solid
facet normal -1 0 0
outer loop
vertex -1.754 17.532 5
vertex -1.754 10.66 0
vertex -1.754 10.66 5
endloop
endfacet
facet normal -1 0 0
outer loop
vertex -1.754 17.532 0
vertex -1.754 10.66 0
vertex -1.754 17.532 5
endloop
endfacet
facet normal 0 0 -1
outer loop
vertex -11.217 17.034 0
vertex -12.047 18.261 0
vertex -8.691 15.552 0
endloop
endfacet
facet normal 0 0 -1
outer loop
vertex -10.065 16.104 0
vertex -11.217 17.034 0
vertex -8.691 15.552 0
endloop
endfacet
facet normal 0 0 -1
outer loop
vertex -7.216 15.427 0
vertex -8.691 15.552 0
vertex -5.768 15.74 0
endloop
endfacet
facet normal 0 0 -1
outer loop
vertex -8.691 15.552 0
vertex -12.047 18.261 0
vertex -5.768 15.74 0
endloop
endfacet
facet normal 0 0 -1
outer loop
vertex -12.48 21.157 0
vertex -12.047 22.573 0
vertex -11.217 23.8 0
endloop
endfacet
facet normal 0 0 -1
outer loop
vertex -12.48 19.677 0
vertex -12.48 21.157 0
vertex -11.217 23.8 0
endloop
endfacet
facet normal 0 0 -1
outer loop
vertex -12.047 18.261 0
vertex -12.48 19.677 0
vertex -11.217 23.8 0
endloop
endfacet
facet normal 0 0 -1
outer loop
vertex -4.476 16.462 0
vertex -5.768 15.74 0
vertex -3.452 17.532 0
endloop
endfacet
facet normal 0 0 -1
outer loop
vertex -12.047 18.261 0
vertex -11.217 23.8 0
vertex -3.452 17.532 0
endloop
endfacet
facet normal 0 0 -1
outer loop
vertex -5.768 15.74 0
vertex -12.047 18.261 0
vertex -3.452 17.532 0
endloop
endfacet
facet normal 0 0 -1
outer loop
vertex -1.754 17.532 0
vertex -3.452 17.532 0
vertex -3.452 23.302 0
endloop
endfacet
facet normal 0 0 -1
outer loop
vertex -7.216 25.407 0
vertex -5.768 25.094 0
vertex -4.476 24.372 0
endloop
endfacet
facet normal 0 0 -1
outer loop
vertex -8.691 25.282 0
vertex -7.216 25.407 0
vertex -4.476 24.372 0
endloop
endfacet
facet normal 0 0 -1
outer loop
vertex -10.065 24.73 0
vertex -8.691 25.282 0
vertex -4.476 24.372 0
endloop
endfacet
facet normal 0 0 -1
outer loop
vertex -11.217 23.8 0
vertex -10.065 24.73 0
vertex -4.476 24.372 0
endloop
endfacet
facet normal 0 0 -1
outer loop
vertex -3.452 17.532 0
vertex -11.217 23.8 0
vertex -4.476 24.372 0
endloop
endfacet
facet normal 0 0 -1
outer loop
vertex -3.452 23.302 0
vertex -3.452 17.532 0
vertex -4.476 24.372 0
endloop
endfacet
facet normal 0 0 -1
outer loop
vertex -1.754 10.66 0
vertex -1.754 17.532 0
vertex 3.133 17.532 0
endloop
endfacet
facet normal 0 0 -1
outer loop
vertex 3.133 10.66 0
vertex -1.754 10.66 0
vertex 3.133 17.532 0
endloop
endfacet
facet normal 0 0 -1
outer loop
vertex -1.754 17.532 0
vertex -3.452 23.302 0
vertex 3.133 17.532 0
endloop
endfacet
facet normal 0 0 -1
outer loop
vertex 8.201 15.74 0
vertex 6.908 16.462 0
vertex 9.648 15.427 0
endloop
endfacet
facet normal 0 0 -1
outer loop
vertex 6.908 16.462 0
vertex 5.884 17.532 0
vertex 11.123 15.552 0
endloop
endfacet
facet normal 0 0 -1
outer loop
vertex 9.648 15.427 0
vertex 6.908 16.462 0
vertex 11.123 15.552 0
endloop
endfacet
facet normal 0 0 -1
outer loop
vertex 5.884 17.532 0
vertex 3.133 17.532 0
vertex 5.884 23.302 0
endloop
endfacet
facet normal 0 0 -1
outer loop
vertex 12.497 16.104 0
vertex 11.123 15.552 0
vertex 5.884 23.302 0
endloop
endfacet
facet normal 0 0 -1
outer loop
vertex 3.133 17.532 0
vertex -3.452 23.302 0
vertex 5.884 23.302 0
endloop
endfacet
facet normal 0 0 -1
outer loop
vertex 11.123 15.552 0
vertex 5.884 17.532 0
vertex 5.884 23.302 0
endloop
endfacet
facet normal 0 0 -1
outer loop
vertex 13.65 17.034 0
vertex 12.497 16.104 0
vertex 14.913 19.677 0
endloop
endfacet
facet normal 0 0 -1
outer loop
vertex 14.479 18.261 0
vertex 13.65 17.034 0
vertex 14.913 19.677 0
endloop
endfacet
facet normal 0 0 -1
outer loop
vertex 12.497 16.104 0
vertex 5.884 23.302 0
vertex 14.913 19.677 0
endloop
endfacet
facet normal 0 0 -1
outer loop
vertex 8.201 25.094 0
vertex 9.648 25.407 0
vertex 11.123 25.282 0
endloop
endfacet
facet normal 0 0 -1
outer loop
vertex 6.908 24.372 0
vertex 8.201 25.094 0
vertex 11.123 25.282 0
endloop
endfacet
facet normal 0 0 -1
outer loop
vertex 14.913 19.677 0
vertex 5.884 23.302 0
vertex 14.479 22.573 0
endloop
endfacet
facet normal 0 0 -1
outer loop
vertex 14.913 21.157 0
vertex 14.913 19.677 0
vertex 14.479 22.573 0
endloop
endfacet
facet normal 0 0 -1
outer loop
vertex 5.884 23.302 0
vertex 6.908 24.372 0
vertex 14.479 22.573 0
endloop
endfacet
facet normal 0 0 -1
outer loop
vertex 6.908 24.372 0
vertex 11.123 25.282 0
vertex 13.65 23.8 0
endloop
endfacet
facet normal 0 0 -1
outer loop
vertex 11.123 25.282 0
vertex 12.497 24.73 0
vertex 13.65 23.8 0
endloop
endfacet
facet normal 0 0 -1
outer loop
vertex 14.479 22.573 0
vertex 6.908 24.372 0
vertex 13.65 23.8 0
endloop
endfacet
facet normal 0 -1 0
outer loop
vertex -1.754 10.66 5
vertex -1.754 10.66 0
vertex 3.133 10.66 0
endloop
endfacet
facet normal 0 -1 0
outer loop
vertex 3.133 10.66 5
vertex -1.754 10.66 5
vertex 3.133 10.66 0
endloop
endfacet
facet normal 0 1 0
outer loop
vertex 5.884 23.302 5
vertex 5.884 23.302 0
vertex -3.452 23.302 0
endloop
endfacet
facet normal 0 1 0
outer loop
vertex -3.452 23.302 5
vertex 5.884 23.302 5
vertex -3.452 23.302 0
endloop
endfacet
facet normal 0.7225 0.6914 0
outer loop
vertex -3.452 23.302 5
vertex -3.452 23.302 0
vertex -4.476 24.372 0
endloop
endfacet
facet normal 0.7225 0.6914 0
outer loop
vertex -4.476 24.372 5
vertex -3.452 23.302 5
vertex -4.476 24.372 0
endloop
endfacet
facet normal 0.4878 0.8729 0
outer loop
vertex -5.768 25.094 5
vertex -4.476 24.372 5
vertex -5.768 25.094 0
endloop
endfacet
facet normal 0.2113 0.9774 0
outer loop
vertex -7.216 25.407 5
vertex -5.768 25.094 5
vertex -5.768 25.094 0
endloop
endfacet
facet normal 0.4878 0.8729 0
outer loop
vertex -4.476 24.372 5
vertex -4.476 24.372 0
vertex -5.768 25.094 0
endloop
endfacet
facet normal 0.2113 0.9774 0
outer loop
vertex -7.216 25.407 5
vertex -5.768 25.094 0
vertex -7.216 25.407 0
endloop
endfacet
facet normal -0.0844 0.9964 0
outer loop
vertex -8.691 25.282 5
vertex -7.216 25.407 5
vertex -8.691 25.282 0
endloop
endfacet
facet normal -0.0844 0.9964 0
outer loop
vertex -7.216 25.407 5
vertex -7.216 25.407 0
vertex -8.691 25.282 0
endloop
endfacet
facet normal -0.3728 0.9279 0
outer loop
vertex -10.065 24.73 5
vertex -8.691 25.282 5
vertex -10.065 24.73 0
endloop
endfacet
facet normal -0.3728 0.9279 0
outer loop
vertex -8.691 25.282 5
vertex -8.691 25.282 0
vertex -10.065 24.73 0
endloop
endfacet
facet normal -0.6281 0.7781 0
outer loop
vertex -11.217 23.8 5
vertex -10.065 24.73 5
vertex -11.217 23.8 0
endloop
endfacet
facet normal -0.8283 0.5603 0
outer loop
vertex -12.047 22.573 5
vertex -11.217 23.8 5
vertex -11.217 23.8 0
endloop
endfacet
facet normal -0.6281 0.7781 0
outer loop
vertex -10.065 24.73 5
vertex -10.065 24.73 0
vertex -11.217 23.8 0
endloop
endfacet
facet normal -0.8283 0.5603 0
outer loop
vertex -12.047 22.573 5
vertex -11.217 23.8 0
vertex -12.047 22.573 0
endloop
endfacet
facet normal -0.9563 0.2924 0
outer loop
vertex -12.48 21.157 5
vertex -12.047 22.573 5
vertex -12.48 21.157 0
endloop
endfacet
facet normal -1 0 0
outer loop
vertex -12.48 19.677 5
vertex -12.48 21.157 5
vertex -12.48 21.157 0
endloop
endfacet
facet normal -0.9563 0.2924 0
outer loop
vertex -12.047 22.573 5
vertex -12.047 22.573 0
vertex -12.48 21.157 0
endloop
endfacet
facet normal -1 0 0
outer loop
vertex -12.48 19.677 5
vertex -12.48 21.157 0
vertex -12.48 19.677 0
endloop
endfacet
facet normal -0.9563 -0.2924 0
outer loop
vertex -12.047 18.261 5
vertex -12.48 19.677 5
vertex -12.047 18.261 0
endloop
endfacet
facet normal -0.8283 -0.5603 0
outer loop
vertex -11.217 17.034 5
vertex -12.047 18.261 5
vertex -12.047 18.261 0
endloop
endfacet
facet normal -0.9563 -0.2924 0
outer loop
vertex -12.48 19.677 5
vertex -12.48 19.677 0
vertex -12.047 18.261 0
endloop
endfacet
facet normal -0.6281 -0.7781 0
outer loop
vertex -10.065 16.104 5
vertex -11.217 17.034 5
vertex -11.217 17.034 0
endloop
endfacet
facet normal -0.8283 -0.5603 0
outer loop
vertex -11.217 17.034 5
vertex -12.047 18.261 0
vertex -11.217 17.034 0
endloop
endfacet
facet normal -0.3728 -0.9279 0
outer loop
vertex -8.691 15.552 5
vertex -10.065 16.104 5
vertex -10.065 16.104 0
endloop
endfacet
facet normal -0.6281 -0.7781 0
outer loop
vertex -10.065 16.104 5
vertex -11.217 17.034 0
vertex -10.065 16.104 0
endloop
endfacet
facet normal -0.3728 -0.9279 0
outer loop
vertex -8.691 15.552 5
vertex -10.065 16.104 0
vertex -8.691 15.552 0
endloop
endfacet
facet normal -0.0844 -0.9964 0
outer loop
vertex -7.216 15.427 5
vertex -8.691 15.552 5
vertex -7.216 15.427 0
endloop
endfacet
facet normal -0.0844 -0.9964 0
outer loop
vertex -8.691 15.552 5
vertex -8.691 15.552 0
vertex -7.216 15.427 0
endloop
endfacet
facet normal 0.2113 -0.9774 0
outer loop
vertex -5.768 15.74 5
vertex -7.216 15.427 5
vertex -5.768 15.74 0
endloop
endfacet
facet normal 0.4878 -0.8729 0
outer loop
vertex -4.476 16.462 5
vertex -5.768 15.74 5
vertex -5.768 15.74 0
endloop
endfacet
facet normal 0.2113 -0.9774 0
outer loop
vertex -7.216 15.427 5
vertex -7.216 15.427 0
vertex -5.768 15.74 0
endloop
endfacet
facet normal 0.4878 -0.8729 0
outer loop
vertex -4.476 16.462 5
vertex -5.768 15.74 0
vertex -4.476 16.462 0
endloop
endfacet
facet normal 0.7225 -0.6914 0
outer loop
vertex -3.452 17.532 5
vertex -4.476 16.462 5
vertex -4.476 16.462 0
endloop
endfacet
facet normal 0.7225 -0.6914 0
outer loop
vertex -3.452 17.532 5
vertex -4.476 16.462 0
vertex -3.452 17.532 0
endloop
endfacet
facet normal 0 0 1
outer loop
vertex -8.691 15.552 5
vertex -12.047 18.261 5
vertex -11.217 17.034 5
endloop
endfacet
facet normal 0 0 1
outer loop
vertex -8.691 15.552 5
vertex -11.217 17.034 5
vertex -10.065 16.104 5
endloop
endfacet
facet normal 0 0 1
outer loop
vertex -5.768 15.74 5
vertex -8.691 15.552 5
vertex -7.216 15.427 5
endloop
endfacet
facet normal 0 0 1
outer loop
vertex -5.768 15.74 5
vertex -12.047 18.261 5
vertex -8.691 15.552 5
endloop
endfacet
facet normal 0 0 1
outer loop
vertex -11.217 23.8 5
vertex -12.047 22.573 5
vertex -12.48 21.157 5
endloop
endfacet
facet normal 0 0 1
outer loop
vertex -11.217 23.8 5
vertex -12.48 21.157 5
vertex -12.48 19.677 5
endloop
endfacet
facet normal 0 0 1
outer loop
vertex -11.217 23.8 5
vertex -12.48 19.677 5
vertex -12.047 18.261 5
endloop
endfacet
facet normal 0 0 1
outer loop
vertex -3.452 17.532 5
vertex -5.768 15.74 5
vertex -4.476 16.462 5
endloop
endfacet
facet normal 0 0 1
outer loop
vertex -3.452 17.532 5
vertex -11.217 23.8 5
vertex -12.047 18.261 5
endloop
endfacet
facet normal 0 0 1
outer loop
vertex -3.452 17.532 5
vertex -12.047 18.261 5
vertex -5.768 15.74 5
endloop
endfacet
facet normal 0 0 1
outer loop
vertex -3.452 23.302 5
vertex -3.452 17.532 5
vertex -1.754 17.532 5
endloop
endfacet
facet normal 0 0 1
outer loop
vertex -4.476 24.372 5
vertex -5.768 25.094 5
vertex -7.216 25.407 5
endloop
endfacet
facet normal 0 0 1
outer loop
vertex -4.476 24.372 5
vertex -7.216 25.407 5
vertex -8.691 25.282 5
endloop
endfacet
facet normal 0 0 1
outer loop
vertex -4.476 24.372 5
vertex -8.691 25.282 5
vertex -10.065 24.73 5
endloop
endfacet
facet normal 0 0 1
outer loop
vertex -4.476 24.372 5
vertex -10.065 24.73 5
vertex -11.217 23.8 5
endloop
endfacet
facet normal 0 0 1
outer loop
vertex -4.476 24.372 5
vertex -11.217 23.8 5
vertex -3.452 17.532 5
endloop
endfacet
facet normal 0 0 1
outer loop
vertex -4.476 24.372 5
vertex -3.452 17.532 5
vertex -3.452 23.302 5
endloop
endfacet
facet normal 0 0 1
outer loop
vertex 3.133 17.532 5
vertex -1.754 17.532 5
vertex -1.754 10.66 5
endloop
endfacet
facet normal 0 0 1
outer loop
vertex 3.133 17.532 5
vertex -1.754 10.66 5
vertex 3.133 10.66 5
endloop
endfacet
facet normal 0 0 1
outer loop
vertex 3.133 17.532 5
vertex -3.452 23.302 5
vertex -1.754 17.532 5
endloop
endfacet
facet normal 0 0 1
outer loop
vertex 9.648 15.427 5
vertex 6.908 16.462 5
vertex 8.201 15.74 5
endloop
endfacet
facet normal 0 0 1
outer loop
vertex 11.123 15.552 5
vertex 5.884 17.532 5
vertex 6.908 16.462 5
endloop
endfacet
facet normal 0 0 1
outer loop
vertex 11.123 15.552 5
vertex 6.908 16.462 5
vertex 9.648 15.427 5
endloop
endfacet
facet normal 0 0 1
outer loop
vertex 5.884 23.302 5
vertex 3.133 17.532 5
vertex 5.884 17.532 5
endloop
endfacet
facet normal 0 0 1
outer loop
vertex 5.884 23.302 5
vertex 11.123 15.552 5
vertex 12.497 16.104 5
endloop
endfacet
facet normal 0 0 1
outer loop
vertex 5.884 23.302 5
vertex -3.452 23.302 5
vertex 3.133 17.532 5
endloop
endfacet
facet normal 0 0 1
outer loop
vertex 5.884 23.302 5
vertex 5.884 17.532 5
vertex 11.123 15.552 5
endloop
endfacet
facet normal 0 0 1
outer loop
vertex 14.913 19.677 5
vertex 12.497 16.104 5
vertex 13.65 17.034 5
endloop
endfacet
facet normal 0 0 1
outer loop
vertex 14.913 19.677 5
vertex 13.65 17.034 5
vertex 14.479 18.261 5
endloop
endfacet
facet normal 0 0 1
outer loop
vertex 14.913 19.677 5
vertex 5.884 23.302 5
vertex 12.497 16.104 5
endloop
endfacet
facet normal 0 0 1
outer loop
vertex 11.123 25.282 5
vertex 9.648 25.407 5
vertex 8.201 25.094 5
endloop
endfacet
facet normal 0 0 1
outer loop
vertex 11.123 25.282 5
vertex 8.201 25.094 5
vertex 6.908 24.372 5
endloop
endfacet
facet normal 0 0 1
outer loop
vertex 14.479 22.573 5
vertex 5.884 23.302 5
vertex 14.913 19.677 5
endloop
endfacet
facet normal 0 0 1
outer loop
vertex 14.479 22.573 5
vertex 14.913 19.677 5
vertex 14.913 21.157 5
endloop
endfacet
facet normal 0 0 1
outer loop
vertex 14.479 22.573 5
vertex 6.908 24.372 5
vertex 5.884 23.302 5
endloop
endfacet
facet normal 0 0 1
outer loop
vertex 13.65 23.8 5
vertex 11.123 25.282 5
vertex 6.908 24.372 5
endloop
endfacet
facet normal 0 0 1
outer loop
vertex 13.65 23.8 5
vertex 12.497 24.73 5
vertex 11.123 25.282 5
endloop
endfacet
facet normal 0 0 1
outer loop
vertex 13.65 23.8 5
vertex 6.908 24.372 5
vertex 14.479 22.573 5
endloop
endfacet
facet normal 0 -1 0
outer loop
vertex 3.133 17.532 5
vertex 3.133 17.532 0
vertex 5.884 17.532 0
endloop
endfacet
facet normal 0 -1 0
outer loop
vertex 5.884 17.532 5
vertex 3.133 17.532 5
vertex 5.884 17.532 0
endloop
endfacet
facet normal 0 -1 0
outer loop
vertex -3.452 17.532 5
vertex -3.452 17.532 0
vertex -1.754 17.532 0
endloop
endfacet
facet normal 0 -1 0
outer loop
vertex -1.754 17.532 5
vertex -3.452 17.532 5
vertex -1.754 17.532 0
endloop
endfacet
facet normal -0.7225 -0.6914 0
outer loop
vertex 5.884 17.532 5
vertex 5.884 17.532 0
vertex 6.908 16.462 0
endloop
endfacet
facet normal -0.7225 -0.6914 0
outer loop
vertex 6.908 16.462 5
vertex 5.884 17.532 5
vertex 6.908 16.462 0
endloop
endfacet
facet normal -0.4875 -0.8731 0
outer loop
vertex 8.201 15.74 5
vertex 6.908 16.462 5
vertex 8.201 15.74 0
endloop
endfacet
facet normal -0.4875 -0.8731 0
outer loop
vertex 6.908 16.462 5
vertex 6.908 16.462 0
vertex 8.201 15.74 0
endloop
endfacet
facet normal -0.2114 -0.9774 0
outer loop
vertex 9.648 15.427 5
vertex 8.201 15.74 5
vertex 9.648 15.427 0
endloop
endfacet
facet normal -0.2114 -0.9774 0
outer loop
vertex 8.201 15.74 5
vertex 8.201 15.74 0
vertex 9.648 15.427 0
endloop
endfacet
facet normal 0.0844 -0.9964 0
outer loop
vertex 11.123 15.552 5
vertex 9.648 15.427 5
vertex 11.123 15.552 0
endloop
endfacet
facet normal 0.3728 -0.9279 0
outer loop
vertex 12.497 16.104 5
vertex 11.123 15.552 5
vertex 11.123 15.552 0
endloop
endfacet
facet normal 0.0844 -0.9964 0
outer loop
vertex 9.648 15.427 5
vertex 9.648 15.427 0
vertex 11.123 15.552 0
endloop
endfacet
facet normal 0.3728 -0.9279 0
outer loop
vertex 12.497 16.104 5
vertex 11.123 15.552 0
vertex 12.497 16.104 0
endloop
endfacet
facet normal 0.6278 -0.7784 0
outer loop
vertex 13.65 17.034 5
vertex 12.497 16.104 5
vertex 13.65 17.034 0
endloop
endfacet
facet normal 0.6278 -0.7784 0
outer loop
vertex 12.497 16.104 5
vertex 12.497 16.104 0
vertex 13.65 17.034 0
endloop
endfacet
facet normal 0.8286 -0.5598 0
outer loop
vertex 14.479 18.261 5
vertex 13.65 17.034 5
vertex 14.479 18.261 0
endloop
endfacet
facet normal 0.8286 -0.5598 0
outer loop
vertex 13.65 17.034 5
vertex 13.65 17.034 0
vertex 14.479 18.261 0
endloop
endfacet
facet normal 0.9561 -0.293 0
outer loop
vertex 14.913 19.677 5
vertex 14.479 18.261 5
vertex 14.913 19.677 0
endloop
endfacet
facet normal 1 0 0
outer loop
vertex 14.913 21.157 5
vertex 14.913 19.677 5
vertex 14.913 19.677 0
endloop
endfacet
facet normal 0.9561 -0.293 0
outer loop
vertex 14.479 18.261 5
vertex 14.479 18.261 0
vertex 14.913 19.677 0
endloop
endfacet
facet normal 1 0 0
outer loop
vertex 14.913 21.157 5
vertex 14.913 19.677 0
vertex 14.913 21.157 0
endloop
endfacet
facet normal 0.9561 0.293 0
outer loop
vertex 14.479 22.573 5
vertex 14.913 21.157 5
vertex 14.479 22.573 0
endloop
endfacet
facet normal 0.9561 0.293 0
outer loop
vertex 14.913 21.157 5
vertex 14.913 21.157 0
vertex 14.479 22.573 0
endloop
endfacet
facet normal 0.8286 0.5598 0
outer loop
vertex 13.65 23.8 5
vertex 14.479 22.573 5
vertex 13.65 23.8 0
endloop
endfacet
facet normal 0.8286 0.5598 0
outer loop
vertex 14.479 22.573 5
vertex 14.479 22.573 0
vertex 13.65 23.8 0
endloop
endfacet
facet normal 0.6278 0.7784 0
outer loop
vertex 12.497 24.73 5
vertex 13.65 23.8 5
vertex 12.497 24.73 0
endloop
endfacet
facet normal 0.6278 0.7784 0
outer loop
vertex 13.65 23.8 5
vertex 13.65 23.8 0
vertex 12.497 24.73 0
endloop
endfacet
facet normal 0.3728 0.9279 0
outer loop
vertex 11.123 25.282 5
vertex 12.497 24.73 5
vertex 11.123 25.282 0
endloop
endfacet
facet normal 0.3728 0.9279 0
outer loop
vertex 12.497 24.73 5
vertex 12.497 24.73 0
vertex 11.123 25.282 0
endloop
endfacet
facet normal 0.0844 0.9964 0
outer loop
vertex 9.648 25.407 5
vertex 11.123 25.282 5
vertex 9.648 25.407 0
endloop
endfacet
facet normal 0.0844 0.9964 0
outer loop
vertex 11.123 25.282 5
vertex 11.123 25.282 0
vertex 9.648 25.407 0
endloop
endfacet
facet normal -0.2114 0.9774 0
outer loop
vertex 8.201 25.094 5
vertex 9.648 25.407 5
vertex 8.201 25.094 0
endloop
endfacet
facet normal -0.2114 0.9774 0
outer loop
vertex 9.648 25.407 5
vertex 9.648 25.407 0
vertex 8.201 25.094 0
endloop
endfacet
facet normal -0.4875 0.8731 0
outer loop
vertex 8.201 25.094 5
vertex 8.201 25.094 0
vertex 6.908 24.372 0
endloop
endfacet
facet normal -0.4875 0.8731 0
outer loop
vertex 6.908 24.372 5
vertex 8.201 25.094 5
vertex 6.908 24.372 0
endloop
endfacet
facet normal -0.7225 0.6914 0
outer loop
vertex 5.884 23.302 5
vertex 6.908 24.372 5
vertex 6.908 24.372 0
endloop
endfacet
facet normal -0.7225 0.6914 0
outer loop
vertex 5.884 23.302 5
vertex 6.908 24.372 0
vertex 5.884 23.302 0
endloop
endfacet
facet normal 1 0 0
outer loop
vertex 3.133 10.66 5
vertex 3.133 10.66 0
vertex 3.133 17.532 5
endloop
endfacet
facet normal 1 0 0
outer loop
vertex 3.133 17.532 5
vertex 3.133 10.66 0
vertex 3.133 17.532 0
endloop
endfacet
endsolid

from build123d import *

# Parameters (mm, degrees)
F0_W     = 4.8873469356
F0_H     = 6.8713130732
F1_DEPTH = 5


with BuildPart() as f1:
    # F0 (on Top) → F1 (new body)
    with BuildSketch(Plane.XY):
        Polygon((-3.4519004795, 23.3021316447), (-3.4519004795, 17.5317614882), (-1.7539468208, 17.5317614882), (3.1334001148, 17.5317614882), (5.8841257515, 17.5317614882), (5.8841257515, 23.3021316447), align=None)
        with BuildLine():
            ThreePointArc((-3.4519004795, 23.3021316447), (-12.535490452, 20.4169465664), (-3.4519004795, 17.5317614882))
            Line((-3.4519004795, 17.5317614882), (-3.4519004795, 23.3021316447))
        make_face()
        with Locations((0.689726647, 14.0961049516)):
            Rectangle(F0_W, F0_H)
        with BuildLine():
            ThreePointArc((5.8841257515, 17.5317614882), (14.9677157241, 20.4169465664), (5.8841257515, 23.3021316447))
            Line((5.8841257515, 23.3021316447), (5.8841257515, 17.5317614882))
        make_face()
    extrude(amount=F1_DEPTH)


solid = f1.part
